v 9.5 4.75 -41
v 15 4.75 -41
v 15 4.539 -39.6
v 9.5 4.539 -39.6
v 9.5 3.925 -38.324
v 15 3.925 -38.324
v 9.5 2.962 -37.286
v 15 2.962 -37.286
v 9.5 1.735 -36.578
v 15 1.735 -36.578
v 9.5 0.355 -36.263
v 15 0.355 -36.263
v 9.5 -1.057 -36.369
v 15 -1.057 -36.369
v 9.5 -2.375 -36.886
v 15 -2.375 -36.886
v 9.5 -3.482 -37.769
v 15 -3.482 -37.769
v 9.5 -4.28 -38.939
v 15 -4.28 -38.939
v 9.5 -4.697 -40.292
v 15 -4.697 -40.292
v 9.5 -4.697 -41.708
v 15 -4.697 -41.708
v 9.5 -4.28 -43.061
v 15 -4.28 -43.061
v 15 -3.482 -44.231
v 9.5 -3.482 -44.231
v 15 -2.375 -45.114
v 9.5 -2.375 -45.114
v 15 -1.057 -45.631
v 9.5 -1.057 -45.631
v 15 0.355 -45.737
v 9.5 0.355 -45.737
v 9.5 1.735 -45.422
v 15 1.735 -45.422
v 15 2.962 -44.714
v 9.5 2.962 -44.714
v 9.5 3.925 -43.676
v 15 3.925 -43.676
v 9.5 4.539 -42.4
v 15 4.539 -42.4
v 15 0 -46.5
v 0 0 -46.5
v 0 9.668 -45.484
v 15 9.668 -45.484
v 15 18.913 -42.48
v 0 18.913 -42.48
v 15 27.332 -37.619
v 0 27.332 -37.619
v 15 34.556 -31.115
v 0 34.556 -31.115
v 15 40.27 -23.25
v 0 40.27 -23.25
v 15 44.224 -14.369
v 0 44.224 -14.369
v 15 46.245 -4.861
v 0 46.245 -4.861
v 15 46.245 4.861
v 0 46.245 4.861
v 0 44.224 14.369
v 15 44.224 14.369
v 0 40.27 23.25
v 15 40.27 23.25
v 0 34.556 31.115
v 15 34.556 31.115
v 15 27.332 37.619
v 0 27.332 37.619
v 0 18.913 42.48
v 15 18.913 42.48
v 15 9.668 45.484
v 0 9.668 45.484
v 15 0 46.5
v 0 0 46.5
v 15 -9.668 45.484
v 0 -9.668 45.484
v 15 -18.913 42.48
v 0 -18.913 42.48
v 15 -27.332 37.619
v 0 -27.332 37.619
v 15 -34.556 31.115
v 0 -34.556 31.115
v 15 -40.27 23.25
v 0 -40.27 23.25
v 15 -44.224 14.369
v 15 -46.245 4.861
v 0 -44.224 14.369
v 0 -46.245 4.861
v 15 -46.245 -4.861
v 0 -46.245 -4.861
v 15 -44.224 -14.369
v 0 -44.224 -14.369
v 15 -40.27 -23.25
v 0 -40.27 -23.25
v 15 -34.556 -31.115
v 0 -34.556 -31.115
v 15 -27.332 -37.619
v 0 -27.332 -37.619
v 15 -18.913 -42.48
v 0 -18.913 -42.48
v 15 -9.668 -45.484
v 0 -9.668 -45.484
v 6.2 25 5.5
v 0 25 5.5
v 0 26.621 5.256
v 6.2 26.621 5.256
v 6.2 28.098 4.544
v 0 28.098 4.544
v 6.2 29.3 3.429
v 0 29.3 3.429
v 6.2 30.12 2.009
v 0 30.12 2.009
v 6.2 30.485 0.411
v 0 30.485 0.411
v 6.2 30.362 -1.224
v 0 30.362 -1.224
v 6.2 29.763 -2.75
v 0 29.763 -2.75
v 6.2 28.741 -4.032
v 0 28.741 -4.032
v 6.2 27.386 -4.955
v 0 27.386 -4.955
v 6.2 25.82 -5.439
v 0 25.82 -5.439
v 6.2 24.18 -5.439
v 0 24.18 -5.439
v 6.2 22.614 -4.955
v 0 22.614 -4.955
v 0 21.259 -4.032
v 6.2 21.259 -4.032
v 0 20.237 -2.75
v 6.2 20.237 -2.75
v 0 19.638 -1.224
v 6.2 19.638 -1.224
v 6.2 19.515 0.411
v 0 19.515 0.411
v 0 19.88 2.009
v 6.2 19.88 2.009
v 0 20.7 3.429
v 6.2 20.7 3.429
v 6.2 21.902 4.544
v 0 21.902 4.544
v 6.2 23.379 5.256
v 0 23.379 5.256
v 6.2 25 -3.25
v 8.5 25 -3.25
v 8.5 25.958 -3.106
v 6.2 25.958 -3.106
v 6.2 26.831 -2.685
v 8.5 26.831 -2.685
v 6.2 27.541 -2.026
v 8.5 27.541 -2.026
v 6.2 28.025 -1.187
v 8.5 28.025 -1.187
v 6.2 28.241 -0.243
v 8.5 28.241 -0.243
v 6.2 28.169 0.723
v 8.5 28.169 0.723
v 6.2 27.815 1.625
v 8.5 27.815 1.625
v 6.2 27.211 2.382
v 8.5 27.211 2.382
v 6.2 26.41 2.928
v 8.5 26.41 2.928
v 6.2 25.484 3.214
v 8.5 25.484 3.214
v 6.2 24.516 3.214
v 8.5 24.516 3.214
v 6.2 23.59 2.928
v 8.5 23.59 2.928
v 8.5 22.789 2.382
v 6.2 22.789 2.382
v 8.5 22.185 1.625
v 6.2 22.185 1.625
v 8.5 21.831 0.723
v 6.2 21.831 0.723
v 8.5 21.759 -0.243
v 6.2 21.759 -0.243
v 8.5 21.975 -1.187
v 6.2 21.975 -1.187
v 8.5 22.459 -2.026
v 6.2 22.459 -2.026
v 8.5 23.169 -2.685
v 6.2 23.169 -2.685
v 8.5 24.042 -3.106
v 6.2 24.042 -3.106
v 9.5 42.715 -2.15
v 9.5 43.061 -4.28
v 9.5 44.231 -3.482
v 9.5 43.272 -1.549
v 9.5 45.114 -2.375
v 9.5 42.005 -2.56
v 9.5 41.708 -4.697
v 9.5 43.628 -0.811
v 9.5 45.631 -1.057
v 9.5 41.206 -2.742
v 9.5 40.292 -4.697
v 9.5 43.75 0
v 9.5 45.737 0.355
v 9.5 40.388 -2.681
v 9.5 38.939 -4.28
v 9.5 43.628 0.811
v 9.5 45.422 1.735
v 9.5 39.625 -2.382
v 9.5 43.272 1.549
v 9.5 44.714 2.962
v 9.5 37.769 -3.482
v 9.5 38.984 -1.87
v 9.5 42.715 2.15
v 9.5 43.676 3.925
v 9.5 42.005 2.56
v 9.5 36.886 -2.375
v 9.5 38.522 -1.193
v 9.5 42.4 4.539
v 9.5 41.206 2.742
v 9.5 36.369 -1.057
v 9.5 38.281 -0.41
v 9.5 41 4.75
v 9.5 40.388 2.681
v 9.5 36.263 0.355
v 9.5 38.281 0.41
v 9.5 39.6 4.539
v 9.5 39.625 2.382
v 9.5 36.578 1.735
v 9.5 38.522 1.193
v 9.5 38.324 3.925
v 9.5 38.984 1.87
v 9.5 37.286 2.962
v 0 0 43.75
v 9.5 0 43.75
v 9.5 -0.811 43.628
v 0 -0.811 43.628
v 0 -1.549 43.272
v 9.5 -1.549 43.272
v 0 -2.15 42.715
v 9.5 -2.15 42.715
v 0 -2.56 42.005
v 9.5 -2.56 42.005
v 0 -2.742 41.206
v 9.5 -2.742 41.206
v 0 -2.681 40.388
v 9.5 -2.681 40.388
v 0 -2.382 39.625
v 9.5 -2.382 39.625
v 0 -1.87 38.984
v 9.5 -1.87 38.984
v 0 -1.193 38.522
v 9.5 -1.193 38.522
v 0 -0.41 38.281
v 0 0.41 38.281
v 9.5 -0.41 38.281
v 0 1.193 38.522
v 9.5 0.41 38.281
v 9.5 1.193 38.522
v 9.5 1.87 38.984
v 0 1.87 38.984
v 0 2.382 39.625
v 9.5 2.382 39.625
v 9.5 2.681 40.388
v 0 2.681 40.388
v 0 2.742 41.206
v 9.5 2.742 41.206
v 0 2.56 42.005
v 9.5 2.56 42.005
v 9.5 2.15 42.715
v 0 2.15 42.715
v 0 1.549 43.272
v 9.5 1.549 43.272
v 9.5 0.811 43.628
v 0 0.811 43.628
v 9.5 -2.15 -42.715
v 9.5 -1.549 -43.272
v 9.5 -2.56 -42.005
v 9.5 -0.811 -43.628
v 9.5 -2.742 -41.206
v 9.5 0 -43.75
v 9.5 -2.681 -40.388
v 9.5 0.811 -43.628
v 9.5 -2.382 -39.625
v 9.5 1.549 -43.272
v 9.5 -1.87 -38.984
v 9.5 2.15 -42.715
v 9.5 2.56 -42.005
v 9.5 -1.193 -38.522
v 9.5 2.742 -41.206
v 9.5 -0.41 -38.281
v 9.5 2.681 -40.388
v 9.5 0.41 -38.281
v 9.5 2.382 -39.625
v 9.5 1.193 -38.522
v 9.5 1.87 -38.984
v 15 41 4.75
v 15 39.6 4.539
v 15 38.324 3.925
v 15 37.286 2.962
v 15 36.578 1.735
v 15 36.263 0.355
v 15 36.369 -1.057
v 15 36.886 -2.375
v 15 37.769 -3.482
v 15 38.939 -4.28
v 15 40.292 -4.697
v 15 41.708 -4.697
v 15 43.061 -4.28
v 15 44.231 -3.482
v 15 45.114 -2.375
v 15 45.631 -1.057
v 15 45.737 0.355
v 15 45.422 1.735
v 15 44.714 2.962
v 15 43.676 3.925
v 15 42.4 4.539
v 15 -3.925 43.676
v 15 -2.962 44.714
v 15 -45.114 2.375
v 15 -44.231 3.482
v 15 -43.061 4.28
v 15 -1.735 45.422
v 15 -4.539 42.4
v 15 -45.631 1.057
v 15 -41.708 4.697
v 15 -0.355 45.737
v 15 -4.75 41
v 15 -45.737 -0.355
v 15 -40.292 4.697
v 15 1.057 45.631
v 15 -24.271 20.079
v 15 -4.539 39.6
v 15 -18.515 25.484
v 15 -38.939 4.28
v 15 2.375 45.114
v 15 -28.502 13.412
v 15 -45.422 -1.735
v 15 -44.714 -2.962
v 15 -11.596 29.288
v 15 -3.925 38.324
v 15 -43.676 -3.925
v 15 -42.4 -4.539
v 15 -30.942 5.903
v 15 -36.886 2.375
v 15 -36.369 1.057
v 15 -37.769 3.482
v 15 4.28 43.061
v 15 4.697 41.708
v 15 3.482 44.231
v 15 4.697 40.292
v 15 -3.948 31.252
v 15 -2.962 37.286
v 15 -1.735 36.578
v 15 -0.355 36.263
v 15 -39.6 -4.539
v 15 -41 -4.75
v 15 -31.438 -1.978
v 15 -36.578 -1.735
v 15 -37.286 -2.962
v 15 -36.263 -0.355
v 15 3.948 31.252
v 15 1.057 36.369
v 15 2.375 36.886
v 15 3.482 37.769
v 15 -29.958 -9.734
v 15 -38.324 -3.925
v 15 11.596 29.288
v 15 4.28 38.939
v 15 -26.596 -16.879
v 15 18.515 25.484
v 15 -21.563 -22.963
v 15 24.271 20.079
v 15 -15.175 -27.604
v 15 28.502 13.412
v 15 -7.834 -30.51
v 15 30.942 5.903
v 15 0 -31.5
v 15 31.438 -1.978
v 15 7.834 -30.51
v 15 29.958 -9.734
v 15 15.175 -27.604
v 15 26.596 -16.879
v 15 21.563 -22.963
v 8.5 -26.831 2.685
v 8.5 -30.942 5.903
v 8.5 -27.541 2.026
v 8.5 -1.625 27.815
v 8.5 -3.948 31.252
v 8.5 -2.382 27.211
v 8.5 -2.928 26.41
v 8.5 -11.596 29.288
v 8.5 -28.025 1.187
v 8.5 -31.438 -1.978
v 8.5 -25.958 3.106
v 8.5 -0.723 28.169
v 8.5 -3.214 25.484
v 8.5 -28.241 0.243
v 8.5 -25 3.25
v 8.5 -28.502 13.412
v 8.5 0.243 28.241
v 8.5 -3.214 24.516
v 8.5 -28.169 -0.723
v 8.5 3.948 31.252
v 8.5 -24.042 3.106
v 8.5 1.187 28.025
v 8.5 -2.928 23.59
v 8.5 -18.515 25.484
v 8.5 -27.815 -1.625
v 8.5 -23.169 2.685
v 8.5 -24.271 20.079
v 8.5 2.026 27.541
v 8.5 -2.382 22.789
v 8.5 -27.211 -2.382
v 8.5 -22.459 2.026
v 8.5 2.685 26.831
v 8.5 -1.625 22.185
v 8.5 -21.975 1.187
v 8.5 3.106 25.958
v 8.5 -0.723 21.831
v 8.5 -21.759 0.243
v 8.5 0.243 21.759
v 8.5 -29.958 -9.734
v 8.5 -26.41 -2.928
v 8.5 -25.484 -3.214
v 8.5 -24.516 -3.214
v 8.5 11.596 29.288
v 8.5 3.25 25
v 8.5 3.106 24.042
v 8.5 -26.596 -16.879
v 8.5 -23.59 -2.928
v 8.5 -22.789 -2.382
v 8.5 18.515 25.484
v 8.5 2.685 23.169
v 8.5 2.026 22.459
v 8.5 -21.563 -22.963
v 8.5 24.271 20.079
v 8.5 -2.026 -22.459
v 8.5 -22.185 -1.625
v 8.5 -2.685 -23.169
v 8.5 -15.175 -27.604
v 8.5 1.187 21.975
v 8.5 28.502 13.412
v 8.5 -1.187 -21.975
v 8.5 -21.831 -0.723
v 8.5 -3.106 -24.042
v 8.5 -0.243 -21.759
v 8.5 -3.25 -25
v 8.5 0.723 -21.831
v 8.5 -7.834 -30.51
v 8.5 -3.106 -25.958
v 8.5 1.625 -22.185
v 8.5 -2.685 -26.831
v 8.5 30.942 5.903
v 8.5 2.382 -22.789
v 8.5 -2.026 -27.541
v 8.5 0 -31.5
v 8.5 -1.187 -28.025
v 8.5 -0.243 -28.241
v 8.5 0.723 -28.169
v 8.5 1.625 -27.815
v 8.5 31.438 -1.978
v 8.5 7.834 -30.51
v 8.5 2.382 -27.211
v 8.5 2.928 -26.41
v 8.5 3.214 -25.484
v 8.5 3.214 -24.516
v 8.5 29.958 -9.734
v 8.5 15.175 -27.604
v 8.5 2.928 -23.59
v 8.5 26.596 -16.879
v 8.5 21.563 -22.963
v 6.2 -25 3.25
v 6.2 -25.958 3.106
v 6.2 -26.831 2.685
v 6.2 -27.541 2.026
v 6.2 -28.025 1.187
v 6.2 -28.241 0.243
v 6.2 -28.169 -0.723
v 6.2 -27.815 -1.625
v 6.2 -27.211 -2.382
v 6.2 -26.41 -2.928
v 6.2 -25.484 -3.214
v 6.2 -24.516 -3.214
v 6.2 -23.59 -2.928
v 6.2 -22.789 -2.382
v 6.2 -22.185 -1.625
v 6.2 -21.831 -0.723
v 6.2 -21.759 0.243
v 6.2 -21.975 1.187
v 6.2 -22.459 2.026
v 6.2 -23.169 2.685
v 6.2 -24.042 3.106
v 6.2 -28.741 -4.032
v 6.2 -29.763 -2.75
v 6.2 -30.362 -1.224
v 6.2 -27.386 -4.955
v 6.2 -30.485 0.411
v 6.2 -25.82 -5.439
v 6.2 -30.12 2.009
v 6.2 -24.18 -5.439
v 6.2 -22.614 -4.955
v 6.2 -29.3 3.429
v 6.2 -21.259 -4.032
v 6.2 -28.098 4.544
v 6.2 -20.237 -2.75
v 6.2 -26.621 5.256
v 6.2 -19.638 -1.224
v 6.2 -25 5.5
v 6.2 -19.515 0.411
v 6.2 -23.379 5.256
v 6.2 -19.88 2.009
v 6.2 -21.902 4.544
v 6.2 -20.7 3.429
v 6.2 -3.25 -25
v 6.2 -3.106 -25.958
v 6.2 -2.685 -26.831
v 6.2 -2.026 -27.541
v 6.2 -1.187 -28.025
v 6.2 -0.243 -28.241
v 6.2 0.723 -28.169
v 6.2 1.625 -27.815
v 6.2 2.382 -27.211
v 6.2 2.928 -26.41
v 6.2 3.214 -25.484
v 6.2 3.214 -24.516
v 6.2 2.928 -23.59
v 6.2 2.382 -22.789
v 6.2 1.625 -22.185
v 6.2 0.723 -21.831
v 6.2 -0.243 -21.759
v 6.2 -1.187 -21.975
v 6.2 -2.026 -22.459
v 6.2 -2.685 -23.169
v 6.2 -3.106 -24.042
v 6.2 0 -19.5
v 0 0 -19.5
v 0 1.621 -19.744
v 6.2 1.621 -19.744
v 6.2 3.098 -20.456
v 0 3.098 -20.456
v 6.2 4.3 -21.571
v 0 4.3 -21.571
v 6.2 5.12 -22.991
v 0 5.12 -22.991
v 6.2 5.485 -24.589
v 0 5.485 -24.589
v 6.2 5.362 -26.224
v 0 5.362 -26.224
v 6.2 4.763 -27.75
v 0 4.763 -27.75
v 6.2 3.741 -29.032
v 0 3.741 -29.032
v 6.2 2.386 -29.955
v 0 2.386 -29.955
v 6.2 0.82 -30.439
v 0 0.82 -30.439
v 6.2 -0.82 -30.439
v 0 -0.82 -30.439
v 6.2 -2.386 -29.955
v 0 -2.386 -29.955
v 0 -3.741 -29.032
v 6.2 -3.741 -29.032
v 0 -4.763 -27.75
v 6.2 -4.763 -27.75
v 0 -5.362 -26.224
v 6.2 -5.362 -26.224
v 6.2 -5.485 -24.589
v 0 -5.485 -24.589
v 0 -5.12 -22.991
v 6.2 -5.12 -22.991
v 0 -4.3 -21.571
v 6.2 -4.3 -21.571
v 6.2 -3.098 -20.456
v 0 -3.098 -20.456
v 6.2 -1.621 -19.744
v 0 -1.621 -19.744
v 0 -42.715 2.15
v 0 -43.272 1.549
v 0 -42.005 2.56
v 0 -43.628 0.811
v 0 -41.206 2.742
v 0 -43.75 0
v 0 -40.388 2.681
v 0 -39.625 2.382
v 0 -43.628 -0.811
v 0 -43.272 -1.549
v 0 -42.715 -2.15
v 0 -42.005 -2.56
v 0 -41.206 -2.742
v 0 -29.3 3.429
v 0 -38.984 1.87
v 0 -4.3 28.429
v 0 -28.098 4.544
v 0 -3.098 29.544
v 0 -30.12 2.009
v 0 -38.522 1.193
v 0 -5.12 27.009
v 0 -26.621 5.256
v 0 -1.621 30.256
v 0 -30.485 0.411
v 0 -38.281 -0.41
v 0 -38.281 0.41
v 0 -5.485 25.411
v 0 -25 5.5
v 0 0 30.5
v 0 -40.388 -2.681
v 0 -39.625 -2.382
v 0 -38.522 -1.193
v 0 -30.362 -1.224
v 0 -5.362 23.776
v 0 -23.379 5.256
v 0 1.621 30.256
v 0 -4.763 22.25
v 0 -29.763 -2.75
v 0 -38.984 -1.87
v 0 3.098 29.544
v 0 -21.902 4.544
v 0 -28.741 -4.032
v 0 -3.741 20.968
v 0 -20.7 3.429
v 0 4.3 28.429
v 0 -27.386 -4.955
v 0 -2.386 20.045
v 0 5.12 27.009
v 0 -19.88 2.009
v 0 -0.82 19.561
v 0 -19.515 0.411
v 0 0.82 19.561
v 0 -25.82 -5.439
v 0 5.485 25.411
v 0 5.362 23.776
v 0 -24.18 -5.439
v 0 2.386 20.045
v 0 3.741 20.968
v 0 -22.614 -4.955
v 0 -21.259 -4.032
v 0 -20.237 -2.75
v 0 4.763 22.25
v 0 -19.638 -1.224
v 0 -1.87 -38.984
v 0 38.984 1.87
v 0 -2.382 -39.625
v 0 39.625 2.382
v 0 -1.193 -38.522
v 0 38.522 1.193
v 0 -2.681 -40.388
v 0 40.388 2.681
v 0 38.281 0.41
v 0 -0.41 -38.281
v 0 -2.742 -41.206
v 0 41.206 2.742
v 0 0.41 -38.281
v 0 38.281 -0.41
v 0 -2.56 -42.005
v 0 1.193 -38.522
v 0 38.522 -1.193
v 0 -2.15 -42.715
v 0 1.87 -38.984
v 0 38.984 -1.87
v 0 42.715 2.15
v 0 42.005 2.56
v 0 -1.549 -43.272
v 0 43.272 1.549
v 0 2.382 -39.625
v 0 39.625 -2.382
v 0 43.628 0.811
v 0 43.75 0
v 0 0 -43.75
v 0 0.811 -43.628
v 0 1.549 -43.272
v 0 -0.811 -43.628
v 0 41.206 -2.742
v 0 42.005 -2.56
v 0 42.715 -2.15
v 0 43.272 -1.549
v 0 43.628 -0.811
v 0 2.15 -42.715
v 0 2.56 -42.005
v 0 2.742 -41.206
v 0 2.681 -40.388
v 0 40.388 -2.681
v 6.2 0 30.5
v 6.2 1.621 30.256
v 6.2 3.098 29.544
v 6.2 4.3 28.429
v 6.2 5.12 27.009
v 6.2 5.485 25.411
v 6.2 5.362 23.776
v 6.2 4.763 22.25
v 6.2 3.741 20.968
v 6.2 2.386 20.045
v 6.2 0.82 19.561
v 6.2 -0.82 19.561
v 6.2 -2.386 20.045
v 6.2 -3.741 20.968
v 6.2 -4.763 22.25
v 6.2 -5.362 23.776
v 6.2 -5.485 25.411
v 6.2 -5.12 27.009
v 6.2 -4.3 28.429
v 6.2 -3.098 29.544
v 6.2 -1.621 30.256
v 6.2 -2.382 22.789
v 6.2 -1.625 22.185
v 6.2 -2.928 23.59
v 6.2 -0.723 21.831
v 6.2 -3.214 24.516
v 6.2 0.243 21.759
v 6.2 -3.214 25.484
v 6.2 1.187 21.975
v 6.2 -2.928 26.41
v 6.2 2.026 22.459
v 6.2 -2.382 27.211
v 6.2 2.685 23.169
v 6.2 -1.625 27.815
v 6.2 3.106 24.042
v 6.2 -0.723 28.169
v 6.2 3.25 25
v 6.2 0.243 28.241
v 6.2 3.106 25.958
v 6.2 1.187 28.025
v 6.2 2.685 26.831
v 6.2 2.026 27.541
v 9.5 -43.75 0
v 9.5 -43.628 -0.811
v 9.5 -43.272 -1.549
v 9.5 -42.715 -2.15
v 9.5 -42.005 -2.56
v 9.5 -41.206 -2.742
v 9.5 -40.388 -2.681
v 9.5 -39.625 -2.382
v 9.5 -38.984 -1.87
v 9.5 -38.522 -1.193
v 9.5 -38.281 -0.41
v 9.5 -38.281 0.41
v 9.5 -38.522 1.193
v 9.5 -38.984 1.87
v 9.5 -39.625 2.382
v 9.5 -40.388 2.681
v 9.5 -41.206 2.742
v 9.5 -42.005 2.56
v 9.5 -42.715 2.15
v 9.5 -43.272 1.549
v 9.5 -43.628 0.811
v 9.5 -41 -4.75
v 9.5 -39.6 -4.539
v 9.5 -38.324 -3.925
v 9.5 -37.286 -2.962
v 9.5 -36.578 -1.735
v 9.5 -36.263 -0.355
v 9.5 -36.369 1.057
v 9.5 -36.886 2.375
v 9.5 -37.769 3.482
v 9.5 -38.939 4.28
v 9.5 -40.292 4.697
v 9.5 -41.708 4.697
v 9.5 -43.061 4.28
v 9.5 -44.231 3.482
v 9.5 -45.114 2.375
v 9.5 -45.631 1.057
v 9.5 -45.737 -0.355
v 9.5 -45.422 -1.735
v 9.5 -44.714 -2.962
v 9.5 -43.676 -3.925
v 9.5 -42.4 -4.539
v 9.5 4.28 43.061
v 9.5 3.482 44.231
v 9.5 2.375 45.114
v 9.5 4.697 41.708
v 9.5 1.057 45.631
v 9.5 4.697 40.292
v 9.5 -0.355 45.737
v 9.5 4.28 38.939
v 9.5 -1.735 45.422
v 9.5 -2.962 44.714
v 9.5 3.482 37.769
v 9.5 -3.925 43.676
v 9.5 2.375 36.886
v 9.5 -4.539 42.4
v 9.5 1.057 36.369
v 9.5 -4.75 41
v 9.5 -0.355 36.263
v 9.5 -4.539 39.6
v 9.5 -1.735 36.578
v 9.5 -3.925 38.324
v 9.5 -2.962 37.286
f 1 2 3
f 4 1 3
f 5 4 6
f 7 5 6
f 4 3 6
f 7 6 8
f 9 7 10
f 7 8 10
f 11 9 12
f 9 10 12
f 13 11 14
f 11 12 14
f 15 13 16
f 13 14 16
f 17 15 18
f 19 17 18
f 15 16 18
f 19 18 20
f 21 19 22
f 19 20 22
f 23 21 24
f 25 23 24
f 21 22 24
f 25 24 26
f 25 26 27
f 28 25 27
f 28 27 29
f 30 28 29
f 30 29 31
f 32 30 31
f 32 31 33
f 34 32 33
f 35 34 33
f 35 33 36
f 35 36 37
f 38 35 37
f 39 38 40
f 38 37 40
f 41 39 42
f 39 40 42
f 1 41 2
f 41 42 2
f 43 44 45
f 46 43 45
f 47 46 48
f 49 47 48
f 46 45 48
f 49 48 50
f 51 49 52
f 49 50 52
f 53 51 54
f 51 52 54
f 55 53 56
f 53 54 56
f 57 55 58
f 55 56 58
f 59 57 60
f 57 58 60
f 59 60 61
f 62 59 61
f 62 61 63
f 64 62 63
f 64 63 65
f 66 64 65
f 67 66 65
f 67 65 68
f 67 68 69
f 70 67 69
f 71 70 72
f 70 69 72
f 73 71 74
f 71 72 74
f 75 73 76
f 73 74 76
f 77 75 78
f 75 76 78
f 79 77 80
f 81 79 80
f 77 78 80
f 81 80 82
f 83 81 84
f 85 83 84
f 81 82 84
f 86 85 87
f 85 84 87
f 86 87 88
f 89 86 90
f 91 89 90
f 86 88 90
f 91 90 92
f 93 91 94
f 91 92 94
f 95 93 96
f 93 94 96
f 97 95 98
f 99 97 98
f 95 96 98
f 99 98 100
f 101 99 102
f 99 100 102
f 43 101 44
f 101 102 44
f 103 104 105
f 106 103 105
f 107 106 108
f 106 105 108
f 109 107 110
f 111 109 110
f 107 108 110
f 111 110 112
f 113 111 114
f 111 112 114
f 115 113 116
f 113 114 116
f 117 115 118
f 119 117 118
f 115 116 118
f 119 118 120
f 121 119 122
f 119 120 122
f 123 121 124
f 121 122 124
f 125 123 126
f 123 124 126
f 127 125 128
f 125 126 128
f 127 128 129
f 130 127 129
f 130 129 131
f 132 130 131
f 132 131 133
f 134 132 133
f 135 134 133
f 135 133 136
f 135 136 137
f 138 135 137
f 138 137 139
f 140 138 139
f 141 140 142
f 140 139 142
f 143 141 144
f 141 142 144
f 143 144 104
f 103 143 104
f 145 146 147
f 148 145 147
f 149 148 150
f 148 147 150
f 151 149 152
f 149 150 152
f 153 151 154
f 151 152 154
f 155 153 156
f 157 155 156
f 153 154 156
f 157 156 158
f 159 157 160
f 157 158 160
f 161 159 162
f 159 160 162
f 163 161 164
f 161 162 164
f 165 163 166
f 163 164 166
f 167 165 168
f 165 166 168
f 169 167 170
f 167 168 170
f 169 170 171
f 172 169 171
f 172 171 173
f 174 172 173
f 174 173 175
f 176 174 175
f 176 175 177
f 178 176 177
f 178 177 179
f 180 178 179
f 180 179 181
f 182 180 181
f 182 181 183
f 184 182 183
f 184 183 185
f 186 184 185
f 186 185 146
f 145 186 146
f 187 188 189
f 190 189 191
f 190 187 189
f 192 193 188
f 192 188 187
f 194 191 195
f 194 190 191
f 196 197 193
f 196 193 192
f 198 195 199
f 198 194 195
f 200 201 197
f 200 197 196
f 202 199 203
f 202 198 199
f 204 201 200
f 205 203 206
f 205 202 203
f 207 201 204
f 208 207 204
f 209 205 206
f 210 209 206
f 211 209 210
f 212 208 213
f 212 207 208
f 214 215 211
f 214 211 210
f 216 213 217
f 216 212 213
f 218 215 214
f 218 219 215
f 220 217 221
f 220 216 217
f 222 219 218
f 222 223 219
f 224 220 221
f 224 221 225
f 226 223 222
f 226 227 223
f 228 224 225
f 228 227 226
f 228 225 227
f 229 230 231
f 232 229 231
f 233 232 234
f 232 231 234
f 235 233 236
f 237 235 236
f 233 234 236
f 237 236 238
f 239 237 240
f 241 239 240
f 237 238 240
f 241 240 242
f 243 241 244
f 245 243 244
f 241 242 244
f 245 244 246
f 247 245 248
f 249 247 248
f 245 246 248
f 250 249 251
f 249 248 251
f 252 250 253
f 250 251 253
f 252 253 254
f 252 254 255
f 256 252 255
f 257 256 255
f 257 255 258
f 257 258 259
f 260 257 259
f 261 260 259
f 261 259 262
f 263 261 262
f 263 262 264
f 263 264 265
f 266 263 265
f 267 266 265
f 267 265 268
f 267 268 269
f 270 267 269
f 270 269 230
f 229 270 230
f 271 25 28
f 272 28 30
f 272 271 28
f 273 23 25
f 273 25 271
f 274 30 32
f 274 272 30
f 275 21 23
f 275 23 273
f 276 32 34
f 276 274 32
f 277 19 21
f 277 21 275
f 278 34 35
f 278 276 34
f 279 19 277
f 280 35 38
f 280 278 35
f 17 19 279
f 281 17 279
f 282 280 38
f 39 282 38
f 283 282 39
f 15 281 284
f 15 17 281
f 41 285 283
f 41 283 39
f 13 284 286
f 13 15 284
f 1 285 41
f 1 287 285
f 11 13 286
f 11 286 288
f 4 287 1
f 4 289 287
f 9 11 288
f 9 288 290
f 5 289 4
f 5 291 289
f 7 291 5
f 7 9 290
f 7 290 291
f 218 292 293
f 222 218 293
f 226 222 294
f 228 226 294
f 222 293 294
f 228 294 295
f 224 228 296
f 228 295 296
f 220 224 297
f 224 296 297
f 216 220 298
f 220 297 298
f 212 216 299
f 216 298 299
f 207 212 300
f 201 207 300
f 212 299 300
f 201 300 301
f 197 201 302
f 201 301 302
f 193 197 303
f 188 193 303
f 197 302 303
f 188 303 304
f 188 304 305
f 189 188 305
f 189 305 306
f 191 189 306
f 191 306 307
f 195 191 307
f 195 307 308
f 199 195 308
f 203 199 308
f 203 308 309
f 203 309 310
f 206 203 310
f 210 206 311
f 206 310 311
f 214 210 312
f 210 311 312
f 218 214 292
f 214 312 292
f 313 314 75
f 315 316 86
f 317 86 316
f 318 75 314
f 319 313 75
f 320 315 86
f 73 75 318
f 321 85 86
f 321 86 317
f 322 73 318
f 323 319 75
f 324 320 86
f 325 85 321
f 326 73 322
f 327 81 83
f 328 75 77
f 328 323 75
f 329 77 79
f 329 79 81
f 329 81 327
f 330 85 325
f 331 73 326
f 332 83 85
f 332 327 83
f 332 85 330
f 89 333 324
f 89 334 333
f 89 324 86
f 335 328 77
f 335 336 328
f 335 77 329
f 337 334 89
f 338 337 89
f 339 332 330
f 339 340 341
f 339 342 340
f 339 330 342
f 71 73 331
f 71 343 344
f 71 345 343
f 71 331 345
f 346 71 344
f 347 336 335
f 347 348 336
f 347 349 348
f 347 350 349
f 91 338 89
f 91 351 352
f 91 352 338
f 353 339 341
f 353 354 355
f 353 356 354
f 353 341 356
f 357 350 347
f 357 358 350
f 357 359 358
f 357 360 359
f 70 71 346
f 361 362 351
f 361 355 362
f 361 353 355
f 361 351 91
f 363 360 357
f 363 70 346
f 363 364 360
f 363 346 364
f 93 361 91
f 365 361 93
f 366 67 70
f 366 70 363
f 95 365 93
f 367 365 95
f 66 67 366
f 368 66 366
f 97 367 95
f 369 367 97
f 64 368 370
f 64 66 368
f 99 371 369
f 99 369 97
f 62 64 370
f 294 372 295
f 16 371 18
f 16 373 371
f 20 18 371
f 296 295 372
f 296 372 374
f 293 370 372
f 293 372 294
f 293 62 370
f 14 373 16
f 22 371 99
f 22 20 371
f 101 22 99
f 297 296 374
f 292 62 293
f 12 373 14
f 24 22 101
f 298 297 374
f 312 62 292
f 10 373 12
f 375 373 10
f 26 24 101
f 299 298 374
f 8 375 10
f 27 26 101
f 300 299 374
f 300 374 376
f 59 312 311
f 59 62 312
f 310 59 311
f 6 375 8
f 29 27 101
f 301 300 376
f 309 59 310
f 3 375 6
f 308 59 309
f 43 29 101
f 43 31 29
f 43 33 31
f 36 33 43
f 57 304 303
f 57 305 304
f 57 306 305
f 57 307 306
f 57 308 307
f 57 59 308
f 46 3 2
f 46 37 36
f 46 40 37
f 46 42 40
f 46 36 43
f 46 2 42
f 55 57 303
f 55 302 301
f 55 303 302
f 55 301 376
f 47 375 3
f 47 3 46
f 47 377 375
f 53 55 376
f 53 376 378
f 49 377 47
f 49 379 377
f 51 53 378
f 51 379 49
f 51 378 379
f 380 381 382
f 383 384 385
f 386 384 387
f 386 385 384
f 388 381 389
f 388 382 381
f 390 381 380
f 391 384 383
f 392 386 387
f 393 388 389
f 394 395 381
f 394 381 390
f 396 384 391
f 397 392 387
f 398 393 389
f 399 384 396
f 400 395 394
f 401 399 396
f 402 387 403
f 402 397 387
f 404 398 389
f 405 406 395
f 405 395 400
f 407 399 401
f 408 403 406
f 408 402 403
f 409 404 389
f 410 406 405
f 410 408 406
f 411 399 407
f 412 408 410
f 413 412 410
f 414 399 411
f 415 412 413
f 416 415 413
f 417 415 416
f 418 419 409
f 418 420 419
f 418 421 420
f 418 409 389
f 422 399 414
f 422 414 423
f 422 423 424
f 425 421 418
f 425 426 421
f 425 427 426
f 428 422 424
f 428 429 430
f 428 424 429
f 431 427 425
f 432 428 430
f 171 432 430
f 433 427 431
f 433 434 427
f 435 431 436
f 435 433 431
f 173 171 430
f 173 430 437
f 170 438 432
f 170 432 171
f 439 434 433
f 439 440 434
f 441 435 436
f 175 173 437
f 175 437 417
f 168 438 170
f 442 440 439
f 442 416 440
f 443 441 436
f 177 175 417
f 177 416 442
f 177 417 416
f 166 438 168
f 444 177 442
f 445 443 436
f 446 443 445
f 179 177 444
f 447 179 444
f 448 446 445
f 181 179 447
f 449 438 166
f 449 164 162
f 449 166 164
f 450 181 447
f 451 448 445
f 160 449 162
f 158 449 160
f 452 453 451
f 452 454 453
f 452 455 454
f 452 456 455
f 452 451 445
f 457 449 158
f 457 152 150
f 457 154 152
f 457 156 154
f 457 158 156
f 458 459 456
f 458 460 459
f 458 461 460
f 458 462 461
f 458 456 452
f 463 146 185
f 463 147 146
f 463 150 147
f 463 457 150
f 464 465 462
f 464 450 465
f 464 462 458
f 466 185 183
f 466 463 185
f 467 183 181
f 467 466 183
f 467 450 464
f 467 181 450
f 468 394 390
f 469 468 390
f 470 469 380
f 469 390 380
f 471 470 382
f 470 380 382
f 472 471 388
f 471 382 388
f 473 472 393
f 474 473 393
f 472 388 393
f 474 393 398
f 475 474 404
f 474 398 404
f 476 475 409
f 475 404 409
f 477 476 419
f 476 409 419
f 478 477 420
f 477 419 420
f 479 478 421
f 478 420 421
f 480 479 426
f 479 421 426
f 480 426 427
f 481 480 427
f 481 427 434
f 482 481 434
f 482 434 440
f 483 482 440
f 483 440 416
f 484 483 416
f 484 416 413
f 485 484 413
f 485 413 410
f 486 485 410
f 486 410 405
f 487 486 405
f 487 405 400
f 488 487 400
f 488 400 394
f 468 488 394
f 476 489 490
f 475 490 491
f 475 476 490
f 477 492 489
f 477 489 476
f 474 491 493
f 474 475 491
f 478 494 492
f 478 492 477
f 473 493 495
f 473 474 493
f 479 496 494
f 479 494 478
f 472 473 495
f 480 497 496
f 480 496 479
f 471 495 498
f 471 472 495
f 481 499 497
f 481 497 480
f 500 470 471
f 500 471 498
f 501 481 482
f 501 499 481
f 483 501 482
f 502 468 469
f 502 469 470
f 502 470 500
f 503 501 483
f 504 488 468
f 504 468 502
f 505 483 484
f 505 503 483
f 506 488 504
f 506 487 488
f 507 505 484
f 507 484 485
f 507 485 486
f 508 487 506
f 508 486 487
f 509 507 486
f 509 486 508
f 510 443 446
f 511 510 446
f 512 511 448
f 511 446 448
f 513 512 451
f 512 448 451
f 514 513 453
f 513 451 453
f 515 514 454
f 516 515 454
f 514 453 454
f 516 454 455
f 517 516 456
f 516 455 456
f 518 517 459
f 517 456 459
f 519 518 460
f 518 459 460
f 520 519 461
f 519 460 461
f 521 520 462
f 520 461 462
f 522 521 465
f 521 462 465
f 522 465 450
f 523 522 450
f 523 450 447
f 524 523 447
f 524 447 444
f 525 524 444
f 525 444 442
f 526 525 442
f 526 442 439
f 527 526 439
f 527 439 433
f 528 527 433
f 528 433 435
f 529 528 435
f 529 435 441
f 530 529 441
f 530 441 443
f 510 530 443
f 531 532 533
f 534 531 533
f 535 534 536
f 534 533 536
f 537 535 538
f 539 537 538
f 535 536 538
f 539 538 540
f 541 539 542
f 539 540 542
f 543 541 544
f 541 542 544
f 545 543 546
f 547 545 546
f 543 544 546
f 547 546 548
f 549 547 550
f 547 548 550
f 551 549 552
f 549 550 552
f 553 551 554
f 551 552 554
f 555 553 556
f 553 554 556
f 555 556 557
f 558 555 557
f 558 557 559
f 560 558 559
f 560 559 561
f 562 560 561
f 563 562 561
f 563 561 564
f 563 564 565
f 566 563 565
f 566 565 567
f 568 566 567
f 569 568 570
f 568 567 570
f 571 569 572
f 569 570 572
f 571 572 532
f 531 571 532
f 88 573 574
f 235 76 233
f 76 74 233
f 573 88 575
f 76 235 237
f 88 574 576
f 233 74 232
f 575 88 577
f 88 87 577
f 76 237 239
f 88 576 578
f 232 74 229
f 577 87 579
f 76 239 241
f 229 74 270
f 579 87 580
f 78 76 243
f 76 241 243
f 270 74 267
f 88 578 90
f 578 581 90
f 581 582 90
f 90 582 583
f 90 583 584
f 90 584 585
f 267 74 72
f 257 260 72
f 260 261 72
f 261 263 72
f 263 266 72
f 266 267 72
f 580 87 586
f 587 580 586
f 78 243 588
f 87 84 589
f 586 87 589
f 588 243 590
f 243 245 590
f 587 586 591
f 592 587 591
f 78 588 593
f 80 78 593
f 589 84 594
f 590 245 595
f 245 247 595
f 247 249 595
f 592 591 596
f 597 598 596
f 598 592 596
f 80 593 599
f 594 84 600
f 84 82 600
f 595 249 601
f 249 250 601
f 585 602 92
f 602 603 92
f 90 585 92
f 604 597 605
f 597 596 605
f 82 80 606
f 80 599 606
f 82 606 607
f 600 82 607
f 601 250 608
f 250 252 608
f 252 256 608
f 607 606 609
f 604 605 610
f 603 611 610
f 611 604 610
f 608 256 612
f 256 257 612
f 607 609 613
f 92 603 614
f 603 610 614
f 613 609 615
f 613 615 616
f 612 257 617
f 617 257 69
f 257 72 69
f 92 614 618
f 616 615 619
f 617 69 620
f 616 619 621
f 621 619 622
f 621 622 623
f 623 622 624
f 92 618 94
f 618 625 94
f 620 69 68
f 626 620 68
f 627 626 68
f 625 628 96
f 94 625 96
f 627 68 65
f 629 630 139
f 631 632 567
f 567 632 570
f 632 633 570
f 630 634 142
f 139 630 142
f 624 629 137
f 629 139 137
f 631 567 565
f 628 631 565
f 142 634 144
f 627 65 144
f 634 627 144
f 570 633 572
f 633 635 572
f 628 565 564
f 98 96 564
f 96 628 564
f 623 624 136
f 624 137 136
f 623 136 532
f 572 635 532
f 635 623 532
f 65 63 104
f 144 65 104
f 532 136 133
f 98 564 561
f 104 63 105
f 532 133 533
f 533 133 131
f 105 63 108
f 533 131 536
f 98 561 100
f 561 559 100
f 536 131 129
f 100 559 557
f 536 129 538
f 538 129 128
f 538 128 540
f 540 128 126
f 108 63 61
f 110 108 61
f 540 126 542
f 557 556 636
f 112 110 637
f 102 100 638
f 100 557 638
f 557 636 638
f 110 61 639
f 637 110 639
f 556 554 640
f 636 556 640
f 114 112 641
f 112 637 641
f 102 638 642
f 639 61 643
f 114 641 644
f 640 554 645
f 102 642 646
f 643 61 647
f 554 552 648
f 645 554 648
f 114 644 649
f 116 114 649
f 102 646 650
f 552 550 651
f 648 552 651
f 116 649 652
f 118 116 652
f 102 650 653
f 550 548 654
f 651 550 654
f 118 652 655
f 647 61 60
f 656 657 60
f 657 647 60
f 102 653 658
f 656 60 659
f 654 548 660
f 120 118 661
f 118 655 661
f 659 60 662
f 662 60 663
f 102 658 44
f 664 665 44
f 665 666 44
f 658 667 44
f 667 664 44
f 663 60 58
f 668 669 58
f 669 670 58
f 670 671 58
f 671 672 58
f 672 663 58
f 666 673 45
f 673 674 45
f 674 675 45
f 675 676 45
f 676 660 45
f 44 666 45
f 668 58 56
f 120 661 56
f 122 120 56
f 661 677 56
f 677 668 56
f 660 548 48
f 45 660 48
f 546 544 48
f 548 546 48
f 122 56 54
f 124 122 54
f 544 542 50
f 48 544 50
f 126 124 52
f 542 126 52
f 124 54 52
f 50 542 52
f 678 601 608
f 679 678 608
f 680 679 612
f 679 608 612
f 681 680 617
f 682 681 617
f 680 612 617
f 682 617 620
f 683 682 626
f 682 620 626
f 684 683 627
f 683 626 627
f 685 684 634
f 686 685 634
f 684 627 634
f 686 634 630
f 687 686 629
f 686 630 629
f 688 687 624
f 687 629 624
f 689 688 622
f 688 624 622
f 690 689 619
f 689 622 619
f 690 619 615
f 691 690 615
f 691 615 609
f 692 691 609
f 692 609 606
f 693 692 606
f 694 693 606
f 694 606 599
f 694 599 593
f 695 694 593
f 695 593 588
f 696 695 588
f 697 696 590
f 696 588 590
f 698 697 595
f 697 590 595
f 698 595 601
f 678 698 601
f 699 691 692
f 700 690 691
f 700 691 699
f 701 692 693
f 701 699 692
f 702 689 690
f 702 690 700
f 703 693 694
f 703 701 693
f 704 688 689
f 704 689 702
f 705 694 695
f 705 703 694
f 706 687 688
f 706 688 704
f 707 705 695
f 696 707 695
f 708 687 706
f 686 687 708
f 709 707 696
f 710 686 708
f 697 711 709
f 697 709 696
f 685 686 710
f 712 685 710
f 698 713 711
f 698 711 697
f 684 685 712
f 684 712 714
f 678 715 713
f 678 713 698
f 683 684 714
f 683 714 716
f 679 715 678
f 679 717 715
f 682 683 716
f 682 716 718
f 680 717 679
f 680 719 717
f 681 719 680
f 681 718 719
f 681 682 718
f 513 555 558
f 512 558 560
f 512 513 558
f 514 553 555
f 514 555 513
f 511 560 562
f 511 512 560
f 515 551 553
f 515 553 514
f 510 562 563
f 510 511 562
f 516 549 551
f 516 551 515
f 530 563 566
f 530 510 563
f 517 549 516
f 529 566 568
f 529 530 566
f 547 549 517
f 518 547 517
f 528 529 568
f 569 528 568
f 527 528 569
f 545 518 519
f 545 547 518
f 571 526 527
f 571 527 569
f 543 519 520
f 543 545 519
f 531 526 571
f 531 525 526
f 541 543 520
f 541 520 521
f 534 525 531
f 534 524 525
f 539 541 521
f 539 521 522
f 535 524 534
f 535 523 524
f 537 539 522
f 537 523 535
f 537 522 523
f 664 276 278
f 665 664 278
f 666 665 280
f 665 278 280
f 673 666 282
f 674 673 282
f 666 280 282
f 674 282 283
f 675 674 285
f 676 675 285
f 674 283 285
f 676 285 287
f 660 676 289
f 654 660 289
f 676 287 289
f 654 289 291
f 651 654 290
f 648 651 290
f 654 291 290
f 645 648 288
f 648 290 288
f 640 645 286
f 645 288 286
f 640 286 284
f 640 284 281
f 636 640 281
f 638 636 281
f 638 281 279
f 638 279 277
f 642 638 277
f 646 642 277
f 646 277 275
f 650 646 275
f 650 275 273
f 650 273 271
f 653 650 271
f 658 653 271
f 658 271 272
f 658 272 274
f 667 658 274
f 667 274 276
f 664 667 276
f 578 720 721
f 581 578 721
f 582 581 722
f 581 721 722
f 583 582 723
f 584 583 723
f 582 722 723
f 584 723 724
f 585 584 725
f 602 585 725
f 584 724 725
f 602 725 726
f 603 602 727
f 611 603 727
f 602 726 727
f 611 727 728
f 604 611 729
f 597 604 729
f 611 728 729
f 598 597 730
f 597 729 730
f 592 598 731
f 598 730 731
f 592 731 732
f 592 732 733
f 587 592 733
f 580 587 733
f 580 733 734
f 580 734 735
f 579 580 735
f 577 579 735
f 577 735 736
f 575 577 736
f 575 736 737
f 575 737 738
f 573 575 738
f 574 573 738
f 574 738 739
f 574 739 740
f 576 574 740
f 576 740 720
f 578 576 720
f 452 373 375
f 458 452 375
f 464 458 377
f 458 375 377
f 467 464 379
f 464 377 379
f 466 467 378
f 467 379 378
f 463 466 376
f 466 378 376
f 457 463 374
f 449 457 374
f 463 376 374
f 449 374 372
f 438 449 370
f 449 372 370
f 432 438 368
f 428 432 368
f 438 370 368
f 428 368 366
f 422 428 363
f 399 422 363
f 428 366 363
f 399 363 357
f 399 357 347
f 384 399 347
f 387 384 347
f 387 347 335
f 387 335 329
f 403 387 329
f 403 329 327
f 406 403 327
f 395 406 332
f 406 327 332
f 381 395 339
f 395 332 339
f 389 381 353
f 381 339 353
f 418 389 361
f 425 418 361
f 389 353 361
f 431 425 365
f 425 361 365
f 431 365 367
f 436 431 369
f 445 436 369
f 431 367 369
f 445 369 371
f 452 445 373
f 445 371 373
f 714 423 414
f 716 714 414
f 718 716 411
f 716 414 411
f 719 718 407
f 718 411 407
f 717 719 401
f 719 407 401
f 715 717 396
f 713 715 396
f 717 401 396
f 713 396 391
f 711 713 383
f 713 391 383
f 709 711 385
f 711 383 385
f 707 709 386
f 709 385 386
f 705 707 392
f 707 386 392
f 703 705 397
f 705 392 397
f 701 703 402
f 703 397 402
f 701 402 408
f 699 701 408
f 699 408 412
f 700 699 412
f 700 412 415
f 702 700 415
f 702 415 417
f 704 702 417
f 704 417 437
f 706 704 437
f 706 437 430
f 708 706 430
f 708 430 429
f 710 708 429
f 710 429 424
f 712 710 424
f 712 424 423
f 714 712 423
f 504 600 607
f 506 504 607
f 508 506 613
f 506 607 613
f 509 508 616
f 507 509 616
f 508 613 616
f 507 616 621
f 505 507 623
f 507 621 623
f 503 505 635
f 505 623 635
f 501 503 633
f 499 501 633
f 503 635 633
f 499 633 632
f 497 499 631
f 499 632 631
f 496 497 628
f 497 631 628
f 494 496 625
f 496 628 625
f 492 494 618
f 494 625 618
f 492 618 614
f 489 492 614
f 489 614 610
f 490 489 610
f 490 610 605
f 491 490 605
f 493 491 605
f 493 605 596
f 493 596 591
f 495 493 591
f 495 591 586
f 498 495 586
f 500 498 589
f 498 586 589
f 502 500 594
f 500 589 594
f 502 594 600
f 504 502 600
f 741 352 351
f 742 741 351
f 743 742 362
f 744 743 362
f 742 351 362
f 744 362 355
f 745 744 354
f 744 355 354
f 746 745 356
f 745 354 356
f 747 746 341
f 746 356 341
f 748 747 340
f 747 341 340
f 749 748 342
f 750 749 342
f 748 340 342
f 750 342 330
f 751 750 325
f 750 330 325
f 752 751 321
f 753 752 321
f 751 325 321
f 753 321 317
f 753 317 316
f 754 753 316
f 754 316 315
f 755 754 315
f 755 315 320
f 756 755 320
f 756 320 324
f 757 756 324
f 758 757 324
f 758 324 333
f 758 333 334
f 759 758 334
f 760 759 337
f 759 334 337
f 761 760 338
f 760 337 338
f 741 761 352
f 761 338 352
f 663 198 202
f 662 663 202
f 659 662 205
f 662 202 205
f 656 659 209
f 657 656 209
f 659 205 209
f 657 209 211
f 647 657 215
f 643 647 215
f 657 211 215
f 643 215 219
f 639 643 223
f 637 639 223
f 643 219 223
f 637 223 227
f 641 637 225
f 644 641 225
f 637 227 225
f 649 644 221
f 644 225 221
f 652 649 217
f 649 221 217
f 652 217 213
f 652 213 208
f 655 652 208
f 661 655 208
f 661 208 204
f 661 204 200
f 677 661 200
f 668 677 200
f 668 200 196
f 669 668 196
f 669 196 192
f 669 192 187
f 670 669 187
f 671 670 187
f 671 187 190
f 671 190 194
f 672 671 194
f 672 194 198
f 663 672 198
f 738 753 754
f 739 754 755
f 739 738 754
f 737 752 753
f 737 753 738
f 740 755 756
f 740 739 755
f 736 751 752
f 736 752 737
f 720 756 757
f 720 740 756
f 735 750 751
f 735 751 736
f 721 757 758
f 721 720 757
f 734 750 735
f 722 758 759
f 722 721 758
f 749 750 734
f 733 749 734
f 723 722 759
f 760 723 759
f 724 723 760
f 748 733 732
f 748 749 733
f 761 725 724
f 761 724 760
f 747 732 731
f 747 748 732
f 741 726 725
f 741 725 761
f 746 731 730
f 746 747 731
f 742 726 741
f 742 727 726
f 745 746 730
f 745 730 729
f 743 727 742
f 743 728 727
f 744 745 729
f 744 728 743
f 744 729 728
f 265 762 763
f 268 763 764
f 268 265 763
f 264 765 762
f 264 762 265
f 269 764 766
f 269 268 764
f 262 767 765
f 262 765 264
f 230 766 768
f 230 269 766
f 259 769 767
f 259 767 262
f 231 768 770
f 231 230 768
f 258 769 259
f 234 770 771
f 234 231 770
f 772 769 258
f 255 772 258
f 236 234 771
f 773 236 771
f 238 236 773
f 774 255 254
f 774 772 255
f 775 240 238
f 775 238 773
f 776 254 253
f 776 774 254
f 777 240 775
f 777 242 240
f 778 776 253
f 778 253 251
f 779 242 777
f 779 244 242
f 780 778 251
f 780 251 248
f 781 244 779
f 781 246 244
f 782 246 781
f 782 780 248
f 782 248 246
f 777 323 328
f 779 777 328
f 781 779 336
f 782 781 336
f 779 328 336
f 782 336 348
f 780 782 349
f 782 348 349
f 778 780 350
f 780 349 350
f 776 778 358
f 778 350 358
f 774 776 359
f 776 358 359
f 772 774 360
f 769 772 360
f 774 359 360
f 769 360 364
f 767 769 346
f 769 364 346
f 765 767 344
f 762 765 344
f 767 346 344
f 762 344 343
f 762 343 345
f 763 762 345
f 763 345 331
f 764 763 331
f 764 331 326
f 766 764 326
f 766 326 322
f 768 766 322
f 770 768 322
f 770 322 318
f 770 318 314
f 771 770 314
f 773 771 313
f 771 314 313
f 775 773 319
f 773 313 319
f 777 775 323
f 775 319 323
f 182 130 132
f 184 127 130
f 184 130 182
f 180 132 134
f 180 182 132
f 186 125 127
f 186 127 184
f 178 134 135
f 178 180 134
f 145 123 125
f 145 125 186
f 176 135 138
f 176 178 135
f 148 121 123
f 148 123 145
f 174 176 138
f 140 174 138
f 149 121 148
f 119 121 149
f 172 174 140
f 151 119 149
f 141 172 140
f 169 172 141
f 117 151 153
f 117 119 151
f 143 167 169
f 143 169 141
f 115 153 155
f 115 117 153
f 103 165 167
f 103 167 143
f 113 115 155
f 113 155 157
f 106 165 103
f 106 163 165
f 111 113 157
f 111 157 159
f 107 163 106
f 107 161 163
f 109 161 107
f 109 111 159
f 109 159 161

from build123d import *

# Parameters (mm, degrees)
SKETCH_1_R               = 46.5
EXTRUDE_1_DEPTH          = 15
SKETCH_2_R               = 31.5
CUT_EXTRUDE_1_DEPTH      = 6.5
SKETCH_3_R               = 3.25
CUT_EXTRUDE_2_DEPTH      = 9.5
PATTERN_CIRCULAR_1_COUNT = 4
SKETCH_4_R               = 5.5
CUT_EXTRUDE_3_DEPTH      = 6.2
SKETCH_5_R               = 2.75
CUT_EXTRUDE_4_DEPTH      = 16
PATTERN_CIRCULAR_2_COUNT = 4
SKETCH_6_R               = 4.75
CUT_EXTRUDE_5_DEPTH      = 5.5
PATTERN_CIRCULAR_3_COUNT = 4


with BuildPart() as part:
    # 草图1 → 凸台-拉伸1 (new body)
    with BuildSketch(Plane(origin=(0, 0, 0), x_dir=(0, 0, -1), z_dir=(1, 0, 0))):
        Circle(SKETCH_1_R)
    extrude(amount=EXTRUDE_1_DEPTH)

    # 草图2 → 切除-拉伸1 (cut)
    with BuildSketch(Plane(origin=(15, 0, 0), x_dir=(0, 0, -1), z_dir=(1, 0, 0))):
        Circle(SKETCH_2_R)
    extrude(amount=-CUT_EXTRUDE_1_DEPTH, mode=Mode.SUBTRACT)

    # 草图3 → 切除-拉伸2 (cut, through all)
    with BuildSketch(Plane(origin=(8.5, 0, 0), x_dir=(0, 0, -1), z_dir=(1, 0, 0))):
        with Locations((0, 25)):
            Circle(SKETCH_3_R)
    cut_extrude_2 = extrude(amount=-CUT_EXTRUDE_2_DEPTH, mode=Mode.SUBTRACT)

    # 阵列(圆周)1: 切除-拉伸2 ×4 about axis
    pattern_circular_1_axis = Axis((0, 0, 0), (1, 0, 0))
    for i in range(1, PATTERN_CIRCULAR_1_COUNT):
        add(cut_extrude_2.rotate(pattern_circular_1_axis, i * 360 / PATTERN_CIRCULAR_1_COUNT), mode=Mode.SUBTRACT)

    # 草图4 → 切除-拉伸3 (cut)
    with BuildSketch(Plane.ZY):
        with Locations((0, 25)):
            Circle(SKETCH_4_R)
        with Locations((-25, 0)):
            Circle(SKETCH_4_R)
        with Locations((0, -25)):
            Circle(SKETCH_4_R)
        with Locations((25, 0)):
            Circle(SKETCH_4_R)
    extrude(amount=-CUT_EXTRUDE_3_DEPTH, mode=Mode.SUBTRACT)

    # 草图5 → 切除-拉伸4 (cut, through all)
    with BuildSketch(Plane(origin=(15, 0, 0), x_dir=(0, 0, -1), z_dir=(1, 0, 0))):
        with Locations((41, 0)):
            Circle(SKETCH_5_R)
    cut_extrude_4 = extrude(amount=-CUT_EXTRUDE_4_DEPTH, mode=Mode.SUBTRACT)

    # 阵列(圆周)2: 切除-拉伸4 ×4 about axis
    pattern_circular_2_axis = Axis((0, 0, 0), (1, 0, 0))
    for i in range(1, PATTERN_CIRCULAR_2_COUNT):
        add(cut_extrude_4.rotate(pattern_circular_2_axis, i * 360 / PATTERN_CIRCULAR_2_COUNT), mode=Mode.SUBTRACT)

    # 草图6 → 切除-拉伸5 (cut)
    with BuildSketch(Plane(origin=(15, 0, 0), x_dir=(0, 0, -1), z_dir=(1, 0, 0))):
        with Locations((0, -41)):
            Circle(SKETCH_6_R)
    cut_extrude_5 = extrude(amount=-CUT_EXTRUDE_5_DEPTH, mode=Mode.SUBTRACT)

    # 阵列(圆周)3: 切除-拉伸5 ×4 about axis
    pattern_circular_3_axis = Axis((0, 0, 0), (1, 0, 0))
    for i in range(1, PATTERN_CIRCULAR_3_COUNT):
        add(cut_extrude_5.rotate(pattern_circular_3_axis, i * 360 / PATTERN_CIRCULAR_3_COUNT), mode=Mode.SUBTRACT)


solid = part.part
